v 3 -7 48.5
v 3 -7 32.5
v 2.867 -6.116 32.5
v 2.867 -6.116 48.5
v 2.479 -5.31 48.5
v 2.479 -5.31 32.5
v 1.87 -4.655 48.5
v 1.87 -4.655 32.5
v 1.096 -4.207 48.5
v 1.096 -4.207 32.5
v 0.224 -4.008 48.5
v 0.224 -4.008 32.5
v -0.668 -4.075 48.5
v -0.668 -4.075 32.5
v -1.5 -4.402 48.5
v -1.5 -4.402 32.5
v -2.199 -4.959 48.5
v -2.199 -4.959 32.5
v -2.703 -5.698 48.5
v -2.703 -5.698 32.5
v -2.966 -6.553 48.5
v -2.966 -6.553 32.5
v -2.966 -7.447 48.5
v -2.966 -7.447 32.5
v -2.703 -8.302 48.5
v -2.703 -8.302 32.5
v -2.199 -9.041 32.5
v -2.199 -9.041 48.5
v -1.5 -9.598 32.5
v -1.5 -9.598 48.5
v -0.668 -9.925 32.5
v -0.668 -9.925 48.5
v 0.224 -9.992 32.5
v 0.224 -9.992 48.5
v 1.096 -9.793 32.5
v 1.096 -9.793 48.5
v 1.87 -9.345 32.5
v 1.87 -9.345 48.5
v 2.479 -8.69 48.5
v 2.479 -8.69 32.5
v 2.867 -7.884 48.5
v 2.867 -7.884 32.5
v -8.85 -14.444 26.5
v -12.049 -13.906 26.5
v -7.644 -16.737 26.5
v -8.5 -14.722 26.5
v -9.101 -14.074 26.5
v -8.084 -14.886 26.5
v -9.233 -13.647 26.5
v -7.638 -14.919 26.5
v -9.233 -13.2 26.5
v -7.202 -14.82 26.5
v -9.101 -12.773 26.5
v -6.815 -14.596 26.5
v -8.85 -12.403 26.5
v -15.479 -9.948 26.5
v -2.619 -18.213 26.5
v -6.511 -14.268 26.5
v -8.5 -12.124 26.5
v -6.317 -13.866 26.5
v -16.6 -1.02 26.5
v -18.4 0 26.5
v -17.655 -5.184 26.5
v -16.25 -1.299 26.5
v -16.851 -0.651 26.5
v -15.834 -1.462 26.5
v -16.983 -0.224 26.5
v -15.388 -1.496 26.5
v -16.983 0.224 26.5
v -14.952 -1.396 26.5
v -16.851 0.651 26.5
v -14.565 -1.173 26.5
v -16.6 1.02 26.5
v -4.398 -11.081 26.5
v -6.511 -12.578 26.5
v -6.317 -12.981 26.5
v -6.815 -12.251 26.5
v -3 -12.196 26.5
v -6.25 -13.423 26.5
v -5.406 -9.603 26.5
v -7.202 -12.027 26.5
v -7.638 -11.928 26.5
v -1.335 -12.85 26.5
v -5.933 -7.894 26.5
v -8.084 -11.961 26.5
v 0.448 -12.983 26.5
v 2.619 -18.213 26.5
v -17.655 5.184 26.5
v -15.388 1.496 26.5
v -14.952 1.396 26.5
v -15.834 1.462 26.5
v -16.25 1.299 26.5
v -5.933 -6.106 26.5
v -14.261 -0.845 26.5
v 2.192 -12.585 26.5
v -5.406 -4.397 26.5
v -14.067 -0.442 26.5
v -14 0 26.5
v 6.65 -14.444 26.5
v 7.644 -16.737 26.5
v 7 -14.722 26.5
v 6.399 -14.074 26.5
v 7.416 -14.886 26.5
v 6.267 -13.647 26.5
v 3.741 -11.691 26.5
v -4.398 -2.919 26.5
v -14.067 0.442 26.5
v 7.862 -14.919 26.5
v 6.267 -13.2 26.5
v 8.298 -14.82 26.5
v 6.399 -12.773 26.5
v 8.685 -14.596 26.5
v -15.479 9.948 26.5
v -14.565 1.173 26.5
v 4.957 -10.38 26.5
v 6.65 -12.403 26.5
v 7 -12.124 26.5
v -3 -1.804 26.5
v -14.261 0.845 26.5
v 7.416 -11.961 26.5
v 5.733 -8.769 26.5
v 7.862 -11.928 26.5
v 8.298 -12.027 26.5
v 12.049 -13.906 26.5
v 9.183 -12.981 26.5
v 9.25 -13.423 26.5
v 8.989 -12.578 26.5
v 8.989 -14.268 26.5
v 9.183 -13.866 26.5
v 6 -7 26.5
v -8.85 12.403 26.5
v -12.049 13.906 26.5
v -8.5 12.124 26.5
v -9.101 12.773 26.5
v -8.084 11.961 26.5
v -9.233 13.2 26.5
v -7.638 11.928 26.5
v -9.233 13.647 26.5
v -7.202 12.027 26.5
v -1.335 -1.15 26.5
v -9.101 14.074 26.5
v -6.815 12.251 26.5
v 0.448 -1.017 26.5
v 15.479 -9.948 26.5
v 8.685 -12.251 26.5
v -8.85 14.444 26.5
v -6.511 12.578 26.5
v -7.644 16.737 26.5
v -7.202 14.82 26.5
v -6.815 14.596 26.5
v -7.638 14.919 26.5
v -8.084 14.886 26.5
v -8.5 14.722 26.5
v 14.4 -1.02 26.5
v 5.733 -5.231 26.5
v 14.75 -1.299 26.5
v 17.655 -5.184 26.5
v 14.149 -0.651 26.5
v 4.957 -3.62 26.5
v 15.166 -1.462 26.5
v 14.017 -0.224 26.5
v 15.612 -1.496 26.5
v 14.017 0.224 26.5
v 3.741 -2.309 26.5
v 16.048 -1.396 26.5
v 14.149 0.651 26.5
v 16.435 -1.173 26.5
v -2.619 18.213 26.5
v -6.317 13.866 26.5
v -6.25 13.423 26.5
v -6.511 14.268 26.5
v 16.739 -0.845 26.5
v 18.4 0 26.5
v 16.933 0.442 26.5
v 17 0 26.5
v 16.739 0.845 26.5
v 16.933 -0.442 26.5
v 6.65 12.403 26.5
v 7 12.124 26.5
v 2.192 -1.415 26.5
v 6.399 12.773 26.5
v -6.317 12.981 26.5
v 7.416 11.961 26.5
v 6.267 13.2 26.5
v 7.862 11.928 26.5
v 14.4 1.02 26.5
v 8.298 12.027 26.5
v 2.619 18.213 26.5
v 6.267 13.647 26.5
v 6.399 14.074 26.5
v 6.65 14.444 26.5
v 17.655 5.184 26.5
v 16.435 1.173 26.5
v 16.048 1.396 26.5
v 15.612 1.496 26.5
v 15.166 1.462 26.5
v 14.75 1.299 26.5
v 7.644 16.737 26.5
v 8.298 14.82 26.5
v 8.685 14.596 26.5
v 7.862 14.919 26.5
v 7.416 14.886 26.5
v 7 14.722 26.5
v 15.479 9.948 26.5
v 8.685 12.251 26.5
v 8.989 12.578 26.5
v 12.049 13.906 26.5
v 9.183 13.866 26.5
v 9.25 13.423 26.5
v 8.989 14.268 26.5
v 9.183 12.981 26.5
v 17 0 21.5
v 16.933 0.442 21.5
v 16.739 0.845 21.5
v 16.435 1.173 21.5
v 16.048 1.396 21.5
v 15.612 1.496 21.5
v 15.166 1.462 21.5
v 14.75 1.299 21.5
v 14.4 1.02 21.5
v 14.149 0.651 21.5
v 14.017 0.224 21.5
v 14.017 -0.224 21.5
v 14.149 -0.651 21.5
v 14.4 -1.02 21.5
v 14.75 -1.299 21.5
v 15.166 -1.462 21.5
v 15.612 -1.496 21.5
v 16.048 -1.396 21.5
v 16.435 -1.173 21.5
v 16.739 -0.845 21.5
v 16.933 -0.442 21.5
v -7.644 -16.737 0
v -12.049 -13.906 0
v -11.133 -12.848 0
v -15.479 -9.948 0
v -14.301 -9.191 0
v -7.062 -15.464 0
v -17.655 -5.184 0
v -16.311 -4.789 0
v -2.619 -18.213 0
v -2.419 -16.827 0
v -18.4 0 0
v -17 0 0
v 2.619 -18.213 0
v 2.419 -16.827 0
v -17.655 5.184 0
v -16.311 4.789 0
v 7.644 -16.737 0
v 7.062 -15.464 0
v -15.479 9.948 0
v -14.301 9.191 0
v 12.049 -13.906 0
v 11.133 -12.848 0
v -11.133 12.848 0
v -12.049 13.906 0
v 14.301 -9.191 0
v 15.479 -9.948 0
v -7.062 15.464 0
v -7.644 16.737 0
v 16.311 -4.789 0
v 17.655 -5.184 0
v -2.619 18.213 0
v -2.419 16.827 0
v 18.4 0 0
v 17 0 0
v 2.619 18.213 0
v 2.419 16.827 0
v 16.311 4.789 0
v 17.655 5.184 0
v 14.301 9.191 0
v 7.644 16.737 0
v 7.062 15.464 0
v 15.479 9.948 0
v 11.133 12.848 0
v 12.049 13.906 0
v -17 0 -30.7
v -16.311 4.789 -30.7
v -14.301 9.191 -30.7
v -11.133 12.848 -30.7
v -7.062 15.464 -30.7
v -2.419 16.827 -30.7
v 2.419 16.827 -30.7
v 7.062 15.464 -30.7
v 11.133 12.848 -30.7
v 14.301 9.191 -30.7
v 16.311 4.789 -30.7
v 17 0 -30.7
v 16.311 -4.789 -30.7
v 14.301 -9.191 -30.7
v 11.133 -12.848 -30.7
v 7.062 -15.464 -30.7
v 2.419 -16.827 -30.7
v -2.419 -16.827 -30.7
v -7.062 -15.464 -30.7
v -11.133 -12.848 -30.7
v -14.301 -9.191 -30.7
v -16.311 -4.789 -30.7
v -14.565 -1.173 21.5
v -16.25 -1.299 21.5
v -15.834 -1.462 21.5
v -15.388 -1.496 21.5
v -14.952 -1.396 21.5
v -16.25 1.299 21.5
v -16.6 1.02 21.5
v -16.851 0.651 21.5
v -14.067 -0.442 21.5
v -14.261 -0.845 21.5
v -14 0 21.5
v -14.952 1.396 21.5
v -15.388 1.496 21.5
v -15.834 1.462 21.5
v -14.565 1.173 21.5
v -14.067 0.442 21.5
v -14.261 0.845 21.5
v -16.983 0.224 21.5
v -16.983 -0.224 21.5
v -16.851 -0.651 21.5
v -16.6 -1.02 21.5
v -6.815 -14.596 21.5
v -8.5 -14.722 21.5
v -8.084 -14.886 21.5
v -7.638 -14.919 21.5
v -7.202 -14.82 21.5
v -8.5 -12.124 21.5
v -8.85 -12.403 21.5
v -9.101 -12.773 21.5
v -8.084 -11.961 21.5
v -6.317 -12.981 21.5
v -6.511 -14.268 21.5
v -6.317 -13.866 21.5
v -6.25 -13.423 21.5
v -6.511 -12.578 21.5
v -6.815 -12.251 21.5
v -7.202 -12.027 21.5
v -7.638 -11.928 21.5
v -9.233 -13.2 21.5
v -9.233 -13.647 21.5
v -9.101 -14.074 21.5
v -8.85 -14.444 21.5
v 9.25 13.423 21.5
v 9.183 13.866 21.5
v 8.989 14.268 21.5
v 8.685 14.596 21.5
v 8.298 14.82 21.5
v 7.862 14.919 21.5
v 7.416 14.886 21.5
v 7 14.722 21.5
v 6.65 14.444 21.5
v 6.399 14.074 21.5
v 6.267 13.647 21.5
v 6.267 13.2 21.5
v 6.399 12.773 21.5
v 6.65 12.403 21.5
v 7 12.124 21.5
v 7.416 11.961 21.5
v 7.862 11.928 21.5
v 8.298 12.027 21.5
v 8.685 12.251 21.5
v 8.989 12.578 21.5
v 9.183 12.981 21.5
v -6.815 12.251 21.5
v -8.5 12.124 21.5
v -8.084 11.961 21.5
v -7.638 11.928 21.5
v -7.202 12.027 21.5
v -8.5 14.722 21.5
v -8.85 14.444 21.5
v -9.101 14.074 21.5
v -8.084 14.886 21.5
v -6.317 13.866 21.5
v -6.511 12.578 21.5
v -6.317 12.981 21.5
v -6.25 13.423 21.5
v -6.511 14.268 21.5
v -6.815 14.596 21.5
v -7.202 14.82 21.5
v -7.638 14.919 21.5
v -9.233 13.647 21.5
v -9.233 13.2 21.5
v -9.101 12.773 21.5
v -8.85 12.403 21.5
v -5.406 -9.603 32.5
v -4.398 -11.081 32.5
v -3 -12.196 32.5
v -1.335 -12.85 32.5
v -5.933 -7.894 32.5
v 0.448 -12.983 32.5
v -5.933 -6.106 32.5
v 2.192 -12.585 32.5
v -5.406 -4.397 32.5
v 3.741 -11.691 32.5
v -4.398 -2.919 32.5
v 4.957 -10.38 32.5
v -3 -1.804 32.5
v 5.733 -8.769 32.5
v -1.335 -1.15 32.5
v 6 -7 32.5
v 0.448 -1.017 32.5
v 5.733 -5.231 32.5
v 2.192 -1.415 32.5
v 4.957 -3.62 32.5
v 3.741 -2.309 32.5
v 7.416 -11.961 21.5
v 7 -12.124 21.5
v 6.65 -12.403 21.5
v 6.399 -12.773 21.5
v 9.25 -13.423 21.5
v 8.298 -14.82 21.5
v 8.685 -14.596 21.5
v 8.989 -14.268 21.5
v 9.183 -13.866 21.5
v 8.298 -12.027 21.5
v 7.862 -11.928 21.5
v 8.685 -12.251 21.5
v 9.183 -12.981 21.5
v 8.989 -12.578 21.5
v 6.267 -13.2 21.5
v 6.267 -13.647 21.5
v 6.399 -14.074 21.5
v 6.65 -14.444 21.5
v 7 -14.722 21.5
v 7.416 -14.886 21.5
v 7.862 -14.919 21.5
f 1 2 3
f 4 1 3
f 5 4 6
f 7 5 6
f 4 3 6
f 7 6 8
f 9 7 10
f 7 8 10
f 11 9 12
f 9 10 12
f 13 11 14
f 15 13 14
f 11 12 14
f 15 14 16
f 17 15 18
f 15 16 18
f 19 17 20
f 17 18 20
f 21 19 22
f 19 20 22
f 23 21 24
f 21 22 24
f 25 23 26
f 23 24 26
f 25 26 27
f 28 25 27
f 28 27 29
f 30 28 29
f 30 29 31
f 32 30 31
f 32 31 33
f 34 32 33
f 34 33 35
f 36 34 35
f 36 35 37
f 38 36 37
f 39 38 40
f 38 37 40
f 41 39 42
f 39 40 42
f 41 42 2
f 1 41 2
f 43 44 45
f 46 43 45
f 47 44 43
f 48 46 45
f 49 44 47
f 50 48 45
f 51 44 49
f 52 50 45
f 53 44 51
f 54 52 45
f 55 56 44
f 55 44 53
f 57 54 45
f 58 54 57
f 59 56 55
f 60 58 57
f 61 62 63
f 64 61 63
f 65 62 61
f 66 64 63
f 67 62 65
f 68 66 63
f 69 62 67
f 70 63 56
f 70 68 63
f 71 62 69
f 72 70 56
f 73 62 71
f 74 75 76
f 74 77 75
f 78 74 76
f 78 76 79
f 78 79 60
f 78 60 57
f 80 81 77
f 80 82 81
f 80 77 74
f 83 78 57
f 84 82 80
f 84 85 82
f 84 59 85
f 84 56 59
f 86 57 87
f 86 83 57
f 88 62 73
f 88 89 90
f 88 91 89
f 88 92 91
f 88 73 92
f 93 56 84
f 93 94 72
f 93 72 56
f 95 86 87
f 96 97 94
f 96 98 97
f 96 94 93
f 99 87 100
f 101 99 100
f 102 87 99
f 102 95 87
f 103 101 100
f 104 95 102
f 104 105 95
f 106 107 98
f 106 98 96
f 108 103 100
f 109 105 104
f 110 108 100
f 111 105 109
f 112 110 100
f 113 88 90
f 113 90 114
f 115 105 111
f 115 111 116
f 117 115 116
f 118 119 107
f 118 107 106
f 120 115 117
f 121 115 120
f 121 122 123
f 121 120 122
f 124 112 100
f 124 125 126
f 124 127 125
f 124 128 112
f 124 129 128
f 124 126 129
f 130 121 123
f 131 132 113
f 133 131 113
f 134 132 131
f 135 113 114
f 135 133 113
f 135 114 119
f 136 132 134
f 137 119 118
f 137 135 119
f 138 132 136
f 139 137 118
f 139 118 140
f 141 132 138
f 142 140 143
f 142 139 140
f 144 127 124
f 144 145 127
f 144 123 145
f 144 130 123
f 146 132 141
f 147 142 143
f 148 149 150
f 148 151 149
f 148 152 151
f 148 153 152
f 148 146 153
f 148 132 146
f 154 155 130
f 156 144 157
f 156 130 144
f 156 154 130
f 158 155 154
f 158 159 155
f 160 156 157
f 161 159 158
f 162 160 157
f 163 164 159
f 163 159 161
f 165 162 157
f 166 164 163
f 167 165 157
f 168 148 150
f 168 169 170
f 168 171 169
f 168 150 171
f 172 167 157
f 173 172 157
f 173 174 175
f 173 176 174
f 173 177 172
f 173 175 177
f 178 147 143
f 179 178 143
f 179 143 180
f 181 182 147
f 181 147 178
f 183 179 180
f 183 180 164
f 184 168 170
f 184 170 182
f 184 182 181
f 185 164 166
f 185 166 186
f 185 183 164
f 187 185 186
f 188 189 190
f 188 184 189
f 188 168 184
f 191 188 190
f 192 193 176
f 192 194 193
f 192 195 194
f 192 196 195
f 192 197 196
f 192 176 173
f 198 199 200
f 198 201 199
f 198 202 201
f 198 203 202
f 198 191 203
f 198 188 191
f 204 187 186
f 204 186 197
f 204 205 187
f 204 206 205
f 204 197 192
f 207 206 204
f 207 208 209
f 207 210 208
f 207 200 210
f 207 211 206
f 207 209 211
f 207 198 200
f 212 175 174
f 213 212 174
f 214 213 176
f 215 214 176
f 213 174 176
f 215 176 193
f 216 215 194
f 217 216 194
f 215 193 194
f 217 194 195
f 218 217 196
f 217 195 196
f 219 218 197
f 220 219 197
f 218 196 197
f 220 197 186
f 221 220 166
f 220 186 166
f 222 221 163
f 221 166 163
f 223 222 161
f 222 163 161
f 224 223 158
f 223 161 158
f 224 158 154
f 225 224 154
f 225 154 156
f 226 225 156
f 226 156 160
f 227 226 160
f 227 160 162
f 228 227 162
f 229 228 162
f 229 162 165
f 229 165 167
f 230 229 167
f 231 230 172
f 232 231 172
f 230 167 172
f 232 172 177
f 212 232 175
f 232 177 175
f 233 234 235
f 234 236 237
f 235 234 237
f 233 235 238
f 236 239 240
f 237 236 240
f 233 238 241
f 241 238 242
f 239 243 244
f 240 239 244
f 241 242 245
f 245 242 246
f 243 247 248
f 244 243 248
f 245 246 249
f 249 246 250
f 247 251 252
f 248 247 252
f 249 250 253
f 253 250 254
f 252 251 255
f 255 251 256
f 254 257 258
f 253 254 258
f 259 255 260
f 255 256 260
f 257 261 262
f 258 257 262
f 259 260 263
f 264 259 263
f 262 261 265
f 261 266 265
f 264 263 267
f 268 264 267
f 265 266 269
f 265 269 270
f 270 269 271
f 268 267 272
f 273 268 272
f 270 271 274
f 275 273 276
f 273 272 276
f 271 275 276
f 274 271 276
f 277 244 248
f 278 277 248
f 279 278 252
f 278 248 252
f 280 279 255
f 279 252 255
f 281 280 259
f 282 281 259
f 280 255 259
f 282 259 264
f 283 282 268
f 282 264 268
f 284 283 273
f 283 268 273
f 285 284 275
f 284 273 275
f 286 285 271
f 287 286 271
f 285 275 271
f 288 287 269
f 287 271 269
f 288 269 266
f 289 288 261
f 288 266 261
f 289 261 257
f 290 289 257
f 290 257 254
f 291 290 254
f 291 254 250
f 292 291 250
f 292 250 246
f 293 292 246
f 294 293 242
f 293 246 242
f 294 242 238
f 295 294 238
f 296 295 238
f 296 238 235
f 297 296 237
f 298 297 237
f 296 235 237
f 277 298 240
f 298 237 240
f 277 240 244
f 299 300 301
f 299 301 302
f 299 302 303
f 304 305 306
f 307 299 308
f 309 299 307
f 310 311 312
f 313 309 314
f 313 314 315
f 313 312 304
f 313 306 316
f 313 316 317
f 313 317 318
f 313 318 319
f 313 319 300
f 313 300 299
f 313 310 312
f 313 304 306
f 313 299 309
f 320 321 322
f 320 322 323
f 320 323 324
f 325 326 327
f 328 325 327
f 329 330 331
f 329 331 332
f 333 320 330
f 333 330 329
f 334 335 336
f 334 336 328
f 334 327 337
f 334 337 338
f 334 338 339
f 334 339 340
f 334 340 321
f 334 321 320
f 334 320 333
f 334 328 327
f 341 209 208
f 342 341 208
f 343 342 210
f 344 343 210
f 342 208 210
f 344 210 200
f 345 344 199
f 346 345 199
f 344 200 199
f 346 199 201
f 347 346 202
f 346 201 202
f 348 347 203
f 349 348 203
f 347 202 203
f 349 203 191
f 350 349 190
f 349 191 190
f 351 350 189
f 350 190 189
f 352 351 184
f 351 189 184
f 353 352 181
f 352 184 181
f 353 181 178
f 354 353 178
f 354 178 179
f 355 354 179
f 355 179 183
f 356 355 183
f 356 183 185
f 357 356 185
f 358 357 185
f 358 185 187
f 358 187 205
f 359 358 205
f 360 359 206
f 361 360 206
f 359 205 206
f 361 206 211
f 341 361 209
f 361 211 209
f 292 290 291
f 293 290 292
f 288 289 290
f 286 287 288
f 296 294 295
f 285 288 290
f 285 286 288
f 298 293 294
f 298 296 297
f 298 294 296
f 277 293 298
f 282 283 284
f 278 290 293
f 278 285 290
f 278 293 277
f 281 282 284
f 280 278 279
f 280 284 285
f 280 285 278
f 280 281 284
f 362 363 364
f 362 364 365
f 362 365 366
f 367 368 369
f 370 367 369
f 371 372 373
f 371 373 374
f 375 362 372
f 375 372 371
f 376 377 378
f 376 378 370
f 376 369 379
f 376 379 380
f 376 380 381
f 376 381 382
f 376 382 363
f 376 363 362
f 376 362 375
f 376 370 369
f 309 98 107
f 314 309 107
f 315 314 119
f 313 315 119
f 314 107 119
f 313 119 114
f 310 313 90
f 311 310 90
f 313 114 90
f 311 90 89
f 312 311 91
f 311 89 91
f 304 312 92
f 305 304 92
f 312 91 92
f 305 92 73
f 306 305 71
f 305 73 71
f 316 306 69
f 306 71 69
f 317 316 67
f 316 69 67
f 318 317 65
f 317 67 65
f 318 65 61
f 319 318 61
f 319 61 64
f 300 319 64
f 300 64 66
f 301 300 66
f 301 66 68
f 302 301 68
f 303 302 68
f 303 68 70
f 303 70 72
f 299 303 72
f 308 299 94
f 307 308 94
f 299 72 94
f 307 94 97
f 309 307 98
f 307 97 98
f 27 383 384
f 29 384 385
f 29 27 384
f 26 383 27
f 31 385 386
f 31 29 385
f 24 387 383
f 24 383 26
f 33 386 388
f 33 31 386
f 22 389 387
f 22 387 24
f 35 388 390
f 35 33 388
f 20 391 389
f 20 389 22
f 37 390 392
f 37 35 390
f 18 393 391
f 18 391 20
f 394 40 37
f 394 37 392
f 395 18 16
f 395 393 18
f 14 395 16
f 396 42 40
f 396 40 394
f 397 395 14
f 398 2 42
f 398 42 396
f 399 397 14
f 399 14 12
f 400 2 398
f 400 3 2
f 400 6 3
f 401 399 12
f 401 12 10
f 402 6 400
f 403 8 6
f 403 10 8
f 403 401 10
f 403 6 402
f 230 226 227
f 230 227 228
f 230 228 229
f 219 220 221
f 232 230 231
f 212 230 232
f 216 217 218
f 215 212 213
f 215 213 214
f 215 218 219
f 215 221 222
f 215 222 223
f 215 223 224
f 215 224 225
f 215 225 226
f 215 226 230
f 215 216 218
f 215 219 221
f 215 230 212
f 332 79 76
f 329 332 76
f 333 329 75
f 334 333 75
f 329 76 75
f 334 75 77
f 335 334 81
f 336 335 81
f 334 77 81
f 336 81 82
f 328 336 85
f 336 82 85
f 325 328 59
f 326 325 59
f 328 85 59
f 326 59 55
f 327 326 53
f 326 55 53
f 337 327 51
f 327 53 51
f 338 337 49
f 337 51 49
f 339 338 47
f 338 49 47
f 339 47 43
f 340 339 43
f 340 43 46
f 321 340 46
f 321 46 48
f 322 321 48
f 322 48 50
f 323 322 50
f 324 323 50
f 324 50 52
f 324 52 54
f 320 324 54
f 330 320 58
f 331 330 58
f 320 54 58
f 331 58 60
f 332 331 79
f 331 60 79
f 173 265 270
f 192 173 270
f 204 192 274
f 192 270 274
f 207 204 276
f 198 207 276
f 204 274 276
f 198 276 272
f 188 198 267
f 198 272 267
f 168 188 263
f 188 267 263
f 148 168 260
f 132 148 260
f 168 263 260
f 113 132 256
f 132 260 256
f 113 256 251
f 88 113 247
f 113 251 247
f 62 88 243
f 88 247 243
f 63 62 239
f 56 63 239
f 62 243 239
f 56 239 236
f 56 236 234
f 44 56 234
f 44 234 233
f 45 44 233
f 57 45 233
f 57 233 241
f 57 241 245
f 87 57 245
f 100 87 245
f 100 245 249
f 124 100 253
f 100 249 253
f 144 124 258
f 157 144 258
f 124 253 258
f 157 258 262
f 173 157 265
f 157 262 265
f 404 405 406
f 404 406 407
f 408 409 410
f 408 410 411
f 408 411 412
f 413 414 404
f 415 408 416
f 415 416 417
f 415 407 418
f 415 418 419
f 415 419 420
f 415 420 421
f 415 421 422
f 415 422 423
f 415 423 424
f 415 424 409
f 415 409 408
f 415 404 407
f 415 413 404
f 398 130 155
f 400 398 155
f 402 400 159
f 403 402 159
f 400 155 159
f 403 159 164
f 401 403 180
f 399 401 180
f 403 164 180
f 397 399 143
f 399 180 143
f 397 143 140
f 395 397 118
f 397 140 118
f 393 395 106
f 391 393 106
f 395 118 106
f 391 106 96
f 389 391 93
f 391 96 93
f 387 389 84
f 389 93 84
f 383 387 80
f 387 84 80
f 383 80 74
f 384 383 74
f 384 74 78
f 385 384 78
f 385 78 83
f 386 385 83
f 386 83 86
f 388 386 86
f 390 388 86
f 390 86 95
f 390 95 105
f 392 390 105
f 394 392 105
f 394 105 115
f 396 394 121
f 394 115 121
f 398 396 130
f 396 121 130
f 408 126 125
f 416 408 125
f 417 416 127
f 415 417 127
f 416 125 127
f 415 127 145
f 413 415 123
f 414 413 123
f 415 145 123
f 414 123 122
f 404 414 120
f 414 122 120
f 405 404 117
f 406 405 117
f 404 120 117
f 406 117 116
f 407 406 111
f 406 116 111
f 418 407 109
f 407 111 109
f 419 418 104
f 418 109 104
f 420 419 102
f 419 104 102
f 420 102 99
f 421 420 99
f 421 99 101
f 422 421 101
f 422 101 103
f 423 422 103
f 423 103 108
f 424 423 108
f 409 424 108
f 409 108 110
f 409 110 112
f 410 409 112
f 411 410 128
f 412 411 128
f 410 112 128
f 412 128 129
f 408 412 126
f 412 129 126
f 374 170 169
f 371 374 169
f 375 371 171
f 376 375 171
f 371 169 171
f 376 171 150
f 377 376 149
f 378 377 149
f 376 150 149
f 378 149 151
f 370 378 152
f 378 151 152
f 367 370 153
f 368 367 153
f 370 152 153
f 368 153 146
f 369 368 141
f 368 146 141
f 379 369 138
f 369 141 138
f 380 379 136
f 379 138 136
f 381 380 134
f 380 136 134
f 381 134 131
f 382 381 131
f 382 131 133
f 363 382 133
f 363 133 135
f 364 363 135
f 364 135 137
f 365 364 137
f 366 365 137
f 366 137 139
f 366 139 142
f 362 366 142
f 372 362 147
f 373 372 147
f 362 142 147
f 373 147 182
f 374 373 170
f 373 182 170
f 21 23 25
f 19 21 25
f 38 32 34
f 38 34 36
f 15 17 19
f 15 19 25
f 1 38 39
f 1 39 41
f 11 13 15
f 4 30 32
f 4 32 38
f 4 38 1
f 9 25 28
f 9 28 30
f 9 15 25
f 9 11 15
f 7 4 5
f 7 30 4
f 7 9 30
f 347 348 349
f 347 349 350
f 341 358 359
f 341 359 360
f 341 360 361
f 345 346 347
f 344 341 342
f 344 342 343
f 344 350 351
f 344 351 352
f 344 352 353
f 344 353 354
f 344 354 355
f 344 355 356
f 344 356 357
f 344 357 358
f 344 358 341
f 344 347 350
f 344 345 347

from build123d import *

# Parameters (mm, degrees)
CROQUIS1_R              = 18.4
SALIENTE_EXTRUIR1_DEPTH = 26.5
CROQUIS2_R              = 17
SALIENTE_EXTRUIR2_DEPTH = 30.7
CROQUIS3_R              = 1.5
CORTAR_EXTRUIR1_DEPTH   = 5
CROQUIS4_R              = 6
SALIENTE_EXTRUIR3_DEPTH = 6
CROQUIS5_R              = 3
SALIENTE_EXTRUIR4_DEPTH = 16


with BuildPart() as part:
    # Croquis1 → Saliente-Extruir1 (new body)
    with BuildSketch(Plane.XY):
        Circle(CROQUIS1_R)
    extrude(amount=SALIENTE_EXTRUIR1_DEPTH)

    # Croquis2 → Saliente-Extruir2 (add)
    with BuildSketch(Plane(origin=(0, 0, 0), x_dir=(-1, 0, 0), z_dir=(0, 0, -1))):
        Circle(CROQUIS2_R)
    extrude(amount=SALIENTE_EXTRUIR2_DEPTH)

    # Croquis3 → Cortar-Extruir1 (cut)
    with BuildSketch(Plane.XY.offset(26.5)):
        with Locations((-15.5, 0)):
            Circle(CROQUIS3_R)
        with Locations((-7.75, 13.423393759)):
            Circle(CROQUIS3_R)
        with Locations((7.75, 13.423393759)):
            Circle(CROQUIS3_R)
        with Locations((15.5, 0)):
            Circle(CROQUIS3_R)
        with Locations((7.75, -13.423393759)):
            Circle(CROQUIS3_R)
        with Locations((-7.75, -13.423393759)):
            Circle(CROQUIS3_R)
    extrude(amount=-CORTAR_EXTRUIR1_DEPTH, mode=Mode.SUBTRACT)

    # Croquis4 → Saliente-Extruir3 (add)
    with BuildSketch(Plane.XY.offset(26.5)):
        with Locations((0, -7)):
            Circle(CROQUIS4_R)
    extrude(amount=SALIENTE_EXTRUIR3_DEPTH)

    # Croquis5 → Saliente-Extruir4 (add)
    with BuildSketch(Plane.XY.offset(32.5)):
        with Locations((0, -7)):
            Circle(CROQUIS5_R)
    extrude(amount=SALIENTE_EXTRUIR4_DEPTH)


solid = part.part
